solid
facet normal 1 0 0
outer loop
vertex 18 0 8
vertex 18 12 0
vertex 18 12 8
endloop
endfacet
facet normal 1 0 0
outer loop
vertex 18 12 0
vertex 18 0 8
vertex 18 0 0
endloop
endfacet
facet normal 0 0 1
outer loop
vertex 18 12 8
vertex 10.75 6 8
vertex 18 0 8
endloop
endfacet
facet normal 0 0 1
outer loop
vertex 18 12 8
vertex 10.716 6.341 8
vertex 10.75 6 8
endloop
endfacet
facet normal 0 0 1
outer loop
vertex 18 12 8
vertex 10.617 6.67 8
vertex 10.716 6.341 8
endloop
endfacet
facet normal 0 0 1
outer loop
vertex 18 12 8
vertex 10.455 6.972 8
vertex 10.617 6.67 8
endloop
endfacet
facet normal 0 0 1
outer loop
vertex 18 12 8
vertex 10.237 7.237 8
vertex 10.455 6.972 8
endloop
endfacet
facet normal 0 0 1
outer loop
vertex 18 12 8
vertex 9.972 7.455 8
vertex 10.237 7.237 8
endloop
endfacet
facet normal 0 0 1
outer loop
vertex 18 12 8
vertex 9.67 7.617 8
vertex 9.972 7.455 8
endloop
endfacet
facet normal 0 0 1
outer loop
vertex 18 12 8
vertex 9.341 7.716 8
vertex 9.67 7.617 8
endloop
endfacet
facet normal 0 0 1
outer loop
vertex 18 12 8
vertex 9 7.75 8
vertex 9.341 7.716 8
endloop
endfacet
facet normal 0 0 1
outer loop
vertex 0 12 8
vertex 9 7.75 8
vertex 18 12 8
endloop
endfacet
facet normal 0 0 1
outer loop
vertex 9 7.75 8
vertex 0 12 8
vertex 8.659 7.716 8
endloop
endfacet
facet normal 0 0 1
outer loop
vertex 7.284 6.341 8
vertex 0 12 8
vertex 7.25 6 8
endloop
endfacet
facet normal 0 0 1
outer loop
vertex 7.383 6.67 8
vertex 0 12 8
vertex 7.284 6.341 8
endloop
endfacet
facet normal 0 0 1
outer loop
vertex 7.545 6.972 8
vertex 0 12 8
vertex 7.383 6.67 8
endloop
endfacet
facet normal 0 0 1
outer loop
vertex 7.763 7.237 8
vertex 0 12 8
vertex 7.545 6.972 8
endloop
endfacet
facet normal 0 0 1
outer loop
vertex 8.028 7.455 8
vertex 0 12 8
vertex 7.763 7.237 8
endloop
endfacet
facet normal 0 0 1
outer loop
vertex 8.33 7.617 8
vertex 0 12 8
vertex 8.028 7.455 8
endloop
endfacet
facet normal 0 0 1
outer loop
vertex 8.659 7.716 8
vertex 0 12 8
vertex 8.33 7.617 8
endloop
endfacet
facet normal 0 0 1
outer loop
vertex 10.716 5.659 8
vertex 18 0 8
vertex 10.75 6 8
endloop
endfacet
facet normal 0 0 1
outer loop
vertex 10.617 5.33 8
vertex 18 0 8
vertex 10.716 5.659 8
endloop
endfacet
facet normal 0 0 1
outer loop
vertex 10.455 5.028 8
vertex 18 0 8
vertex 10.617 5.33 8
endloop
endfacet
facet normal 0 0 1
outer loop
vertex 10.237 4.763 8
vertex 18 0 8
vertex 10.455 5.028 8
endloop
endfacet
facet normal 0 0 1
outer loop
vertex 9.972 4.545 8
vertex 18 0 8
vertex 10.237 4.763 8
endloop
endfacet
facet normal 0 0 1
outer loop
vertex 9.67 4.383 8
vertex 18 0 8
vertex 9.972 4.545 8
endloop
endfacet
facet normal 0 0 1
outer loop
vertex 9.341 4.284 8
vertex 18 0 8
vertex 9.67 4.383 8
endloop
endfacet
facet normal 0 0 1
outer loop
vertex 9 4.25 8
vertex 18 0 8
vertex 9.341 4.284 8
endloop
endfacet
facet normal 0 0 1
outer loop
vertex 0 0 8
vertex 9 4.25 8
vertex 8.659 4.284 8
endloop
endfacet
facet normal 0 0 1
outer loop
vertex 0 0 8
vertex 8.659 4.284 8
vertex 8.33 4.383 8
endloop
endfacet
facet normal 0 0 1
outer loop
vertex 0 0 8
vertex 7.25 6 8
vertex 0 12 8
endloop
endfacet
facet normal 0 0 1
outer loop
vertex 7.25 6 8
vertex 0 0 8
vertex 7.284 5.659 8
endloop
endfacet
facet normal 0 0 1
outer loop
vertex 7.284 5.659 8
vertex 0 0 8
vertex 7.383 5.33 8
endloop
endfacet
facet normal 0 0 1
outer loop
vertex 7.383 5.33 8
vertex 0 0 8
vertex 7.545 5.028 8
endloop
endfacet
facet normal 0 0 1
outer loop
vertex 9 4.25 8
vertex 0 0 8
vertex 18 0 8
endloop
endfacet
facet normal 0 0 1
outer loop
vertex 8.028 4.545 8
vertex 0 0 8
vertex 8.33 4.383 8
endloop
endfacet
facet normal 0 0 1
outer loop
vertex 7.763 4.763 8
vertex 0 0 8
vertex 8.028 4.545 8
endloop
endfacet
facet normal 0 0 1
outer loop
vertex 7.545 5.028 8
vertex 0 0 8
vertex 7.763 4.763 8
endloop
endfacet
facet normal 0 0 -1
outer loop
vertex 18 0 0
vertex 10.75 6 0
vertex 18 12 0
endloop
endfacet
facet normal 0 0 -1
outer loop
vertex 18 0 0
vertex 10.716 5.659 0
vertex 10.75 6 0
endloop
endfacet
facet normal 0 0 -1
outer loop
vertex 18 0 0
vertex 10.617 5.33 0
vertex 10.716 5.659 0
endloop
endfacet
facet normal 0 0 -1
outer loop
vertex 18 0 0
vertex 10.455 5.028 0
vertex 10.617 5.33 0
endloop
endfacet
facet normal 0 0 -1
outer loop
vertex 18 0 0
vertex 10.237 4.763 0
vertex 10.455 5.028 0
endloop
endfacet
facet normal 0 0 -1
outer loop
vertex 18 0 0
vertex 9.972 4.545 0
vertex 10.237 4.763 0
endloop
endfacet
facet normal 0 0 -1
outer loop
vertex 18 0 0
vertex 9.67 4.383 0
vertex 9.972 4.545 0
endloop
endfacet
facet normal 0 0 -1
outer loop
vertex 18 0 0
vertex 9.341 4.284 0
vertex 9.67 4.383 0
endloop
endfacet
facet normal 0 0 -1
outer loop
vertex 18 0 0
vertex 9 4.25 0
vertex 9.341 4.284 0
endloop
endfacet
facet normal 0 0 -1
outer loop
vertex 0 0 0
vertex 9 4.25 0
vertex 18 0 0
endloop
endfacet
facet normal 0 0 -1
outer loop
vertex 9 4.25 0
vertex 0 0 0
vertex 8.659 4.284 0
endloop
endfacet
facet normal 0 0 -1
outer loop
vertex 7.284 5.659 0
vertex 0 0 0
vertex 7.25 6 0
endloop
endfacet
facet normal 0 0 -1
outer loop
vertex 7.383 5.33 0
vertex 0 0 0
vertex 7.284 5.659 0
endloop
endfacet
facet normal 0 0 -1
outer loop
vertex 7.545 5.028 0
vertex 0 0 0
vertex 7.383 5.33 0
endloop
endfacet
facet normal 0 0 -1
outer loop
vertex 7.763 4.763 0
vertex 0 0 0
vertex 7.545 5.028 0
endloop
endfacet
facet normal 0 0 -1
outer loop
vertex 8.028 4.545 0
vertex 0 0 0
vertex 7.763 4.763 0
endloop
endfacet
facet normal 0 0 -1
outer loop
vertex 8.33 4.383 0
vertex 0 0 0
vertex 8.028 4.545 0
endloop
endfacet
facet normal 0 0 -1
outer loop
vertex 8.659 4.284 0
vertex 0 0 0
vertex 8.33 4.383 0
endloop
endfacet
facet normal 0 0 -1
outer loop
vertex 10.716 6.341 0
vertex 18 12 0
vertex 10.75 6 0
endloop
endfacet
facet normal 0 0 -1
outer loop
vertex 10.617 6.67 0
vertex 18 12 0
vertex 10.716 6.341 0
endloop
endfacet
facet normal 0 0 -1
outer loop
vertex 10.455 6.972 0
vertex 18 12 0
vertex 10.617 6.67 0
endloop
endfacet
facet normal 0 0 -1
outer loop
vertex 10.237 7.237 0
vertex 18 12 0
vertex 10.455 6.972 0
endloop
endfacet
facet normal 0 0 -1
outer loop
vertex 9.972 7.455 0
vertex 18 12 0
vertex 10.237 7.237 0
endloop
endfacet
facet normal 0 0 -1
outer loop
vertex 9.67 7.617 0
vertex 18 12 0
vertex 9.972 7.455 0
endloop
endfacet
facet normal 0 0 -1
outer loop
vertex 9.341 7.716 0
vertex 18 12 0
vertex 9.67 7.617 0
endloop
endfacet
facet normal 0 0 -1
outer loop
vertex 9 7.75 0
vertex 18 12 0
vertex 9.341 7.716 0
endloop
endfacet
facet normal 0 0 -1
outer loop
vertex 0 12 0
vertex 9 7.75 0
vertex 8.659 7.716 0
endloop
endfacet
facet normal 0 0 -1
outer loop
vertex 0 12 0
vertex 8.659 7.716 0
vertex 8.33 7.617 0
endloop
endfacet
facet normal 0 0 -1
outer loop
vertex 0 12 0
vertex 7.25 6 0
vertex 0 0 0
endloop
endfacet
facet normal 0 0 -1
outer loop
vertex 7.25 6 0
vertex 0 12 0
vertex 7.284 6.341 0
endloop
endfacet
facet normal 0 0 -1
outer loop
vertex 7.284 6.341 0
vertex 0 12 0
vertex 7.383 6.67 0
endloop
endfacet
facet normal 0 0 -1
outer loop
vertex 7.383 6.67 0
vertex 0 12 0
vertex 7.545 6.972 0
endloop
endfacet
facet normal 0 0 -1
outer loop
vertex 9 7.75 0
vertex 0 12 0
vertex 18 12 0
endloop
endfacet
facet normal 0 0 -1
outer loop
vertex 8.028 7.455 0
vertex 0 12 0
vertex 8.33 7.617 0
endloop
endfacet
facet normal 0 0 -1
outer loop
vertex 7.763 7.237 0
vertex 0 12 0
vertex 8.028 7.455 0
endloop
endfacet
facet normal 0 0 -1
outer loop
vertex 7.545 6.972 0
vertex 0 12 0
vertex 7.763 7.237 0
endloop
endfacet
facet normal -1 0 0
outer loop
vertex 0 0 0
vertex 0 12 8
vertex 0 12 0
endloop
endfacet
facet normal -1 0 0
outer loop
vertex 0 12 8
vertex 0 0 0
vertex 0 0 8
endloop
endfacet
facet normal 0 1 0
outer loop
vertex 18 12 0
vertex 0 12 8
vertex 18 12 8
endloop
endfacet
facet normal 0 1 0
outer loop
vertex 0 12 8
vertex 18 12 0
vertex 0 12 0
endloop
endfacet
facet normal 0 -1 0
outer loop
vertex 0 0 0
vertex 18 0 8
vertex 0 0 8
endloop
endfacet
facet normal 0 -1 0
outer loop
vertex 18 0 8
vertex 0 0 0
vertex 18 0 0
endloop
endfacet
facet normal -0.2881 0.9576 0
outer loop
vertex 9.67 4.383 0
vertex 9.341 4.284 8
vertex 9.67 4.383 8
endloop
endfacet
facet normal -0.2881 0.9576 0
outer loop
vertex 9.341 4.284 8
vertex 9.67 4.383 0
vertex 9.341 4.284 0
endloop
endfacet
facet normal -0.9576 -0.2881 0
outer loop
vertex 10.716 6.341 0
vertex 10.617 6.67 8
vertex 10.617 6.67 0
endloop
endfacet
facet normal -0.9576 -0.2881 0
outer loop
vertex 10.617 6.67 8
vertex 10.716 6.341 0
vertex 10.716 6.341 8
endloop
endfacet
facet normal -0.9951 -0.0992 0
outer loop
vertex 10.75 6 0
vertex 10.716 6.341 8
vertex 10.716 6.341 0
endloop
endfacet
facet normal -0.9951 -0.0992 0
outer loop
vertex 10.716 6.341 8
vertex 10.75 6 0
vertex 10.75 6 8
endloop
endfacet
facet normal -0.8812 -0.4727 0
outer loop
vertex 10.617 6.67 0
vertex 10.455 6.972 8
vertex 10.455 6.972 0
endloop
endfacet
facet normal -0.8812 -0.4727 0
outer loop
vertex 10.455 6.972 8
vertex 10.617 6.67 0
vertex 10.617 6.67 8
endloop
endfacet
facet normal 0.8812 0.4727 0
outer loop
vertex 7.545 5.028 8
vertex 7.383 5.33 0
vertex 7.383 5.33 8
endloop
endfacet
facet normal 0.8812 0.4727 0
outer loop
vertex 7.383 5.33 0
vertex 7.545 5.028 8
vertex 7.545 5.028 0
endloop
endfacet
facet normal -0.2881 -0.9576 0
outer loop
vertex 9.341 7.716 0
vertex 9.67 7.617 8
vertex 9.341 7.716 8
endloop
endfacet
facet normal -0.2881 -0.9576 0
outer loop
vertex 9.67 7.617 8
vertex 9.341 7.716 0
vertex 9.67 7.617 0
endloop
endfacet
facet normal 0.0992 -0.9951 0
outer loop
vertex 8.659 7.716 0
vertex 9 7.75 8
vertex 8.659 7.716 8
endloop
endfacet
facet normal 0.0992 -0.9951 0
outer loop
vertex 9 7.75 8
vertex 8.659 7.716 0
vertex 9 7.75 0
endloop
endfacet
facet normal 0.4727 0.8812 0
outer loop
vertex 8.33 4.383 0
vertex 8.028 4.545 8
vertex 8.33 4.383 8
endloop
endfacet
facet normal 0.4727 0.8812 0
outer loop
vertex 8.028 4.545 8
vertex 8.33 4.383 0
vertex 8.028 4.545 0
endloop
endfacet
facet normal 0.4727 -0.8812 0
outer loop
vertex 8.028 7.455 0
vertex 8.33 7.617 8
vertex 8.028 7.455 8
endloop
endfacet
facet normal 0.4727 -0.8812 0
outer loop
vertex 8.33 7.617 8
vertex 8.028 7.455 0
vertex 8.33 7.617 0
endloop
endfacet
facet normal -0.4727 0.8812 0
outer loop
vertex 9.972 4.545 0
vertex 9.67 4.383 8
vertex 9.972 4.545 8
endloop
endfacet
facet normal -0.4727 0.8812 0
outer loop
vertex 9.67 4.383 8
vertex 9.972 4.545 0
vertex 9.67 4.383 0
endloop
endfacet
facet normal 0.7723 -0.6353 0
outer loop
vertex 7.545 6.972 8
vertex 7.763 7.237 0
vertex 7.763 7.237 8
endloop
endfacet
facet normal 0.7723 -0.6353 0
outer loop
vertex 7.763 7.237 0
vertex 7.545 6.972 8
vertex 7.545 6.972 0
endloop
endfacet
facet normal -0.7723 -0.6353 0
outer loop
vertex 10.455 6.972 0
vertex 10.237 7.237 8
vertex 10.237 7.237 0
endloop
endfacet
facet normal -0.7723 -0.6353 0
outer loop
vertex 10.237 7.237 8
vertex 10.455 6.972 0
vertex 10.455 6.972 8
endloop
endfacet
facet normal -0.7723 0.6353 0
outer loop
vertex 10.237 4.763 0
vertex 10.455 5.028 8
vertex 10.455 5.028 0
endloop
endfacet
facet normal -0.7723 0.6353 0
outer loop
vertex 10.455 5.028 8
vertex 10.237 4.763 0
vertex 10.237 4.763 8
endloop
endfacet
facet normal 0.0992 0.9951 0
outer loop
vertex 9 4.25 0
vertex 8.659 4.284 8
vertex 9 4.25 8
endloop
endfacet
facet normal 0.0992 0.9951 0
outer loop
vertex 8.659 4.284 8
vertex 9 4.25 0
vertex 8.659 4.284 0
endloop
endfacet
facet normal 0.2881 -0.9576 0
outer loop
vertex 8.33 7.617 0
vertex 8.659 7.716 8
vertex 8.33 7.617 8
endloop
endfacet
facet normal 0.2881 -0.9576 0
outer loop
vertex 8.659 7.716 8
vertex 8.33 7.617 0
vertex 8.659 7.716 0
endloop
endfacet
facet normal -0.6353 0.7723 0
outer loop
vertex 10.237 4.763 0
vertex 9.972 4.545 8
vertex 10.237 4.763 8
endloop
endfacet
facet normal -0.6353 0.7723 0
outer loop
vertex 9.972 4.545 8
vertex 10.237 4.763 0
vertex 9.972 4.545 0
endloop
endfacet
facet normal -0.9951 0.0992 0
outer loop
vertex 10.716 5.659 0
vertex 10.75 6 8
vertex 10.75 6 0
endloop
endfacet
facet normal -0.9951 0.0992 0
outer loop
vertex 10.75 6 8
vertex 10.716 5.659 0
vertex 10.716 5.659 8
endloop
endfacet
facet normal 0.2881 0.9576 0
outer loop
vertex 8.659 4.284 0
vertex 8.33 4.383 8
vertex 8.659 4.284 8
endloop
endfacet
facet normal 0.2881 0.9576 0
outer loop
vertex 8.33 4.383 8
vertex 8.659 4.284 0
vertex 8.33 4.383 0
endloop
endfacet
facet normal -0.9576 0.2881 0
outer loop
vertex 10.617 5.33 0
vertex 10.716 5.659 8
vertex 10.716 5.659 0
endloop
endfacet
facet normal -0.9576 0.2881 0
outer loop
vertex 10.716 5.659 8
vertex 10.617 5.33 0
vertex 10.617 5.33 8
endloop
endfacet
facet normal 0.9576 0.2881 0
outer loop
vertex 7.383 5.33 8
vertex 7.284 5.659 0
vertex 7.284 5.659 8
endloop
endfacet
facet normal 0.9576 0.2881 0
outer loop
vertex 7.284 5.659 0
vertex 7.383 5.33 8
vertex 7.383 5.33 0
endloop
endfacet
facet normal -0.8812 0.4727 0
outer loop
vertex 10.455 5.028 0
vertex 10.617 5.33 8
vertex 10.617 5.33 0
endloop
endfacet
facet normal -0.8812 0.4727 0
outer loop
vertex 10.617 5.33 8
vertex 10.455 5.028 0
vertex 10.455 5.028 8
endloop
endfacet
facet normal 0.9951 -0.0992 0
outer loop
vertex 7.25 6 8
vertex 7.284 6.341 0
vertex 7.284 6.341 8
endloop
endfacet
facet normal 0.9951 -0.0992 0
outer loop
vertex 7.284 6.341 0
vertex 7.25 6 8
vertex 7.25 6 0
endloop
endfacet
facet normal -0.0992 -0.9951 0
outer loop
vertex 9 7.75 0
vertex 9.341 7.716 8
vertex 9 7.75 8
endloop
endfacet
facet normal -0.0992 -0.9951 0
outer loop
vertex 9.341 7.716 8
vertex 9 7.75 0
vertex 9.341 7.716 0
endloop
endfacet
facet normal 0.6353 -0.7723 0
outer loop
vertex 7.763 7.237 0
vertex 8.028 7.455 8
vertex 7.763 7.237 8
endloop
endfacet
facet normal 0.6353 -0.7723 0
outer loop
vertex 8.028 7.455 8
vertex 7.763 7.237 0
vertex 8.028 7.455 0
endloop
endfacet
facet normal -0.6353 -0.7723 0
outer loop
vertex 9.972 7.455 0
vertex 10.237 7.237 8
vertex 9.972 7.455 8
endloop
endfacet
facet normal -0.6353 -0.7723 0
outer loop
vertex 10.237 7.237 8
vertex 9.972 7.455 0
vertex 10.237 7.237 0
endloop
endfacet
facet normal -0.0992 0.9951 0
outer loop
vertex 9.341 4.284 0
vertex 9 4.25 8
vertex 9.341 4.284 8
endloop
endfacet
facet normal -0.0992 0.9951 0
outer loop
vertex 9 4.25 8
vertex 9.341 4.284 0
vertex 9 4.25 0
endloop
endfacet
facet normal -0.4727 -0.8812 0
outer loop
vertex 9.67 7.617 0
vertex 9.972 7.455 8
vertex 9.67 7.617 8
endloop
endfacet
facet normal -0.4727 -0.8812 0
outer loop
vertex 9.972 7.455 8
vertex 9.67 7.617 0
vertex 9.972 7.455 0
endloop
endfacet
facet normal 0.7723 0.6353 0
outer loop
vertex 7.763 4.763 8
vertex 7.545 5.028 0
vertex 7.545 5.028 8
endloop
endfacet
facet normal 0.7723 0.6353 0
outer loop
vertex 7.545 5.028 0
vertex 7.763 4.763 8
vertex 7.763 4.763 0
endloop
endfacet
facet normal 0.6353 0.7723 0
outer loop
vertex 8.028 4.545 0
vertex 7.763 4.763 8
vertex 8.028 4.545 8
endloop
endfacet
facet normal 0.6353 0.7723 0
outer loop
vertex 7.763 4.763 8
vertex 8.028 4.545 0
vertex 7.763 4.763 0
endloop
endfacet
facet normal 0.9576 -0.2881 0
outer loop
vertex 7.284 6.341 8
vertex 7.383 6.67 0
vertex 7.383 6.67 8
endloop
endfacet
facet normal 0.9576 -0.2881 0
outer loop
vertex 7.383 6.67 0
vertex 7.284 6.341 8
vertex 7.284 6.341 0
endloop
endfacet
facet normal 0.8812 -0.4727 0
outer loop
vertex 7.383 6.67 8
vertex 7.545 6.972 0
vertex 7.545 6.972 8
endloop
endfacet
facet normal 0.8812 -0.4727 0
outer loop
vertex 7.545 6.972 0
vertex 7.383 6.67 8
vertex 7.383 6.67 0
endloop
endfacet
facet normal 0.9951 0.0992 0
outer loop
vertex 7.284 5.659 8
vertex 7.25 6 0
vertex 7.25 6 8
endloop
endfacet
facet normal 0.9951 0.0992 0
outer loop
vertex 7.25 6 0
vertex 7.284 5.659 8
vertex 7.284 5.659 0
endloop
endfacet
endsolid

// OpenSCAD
$fn = 32;

// ----------------------------------------------------------------------
// Micro pad: drilled pad, 5-20 mm class
// ----------------------------------------------------------------------

// --- parameters (mm) ---
pad_l = 18;               // pad length, X
pad_w = 12;               // pad width, Y
pad_t = 8;                // pad thickness, Z
hole_d = 3.5;             // through hole diameter

difference() {
  cube([pad_l, pad_w, pad_t]);
  translate([pad_l / 2, pad_w / 2, -1])
    cylinder(h = pad_t + 2, d = hole_d);
}
